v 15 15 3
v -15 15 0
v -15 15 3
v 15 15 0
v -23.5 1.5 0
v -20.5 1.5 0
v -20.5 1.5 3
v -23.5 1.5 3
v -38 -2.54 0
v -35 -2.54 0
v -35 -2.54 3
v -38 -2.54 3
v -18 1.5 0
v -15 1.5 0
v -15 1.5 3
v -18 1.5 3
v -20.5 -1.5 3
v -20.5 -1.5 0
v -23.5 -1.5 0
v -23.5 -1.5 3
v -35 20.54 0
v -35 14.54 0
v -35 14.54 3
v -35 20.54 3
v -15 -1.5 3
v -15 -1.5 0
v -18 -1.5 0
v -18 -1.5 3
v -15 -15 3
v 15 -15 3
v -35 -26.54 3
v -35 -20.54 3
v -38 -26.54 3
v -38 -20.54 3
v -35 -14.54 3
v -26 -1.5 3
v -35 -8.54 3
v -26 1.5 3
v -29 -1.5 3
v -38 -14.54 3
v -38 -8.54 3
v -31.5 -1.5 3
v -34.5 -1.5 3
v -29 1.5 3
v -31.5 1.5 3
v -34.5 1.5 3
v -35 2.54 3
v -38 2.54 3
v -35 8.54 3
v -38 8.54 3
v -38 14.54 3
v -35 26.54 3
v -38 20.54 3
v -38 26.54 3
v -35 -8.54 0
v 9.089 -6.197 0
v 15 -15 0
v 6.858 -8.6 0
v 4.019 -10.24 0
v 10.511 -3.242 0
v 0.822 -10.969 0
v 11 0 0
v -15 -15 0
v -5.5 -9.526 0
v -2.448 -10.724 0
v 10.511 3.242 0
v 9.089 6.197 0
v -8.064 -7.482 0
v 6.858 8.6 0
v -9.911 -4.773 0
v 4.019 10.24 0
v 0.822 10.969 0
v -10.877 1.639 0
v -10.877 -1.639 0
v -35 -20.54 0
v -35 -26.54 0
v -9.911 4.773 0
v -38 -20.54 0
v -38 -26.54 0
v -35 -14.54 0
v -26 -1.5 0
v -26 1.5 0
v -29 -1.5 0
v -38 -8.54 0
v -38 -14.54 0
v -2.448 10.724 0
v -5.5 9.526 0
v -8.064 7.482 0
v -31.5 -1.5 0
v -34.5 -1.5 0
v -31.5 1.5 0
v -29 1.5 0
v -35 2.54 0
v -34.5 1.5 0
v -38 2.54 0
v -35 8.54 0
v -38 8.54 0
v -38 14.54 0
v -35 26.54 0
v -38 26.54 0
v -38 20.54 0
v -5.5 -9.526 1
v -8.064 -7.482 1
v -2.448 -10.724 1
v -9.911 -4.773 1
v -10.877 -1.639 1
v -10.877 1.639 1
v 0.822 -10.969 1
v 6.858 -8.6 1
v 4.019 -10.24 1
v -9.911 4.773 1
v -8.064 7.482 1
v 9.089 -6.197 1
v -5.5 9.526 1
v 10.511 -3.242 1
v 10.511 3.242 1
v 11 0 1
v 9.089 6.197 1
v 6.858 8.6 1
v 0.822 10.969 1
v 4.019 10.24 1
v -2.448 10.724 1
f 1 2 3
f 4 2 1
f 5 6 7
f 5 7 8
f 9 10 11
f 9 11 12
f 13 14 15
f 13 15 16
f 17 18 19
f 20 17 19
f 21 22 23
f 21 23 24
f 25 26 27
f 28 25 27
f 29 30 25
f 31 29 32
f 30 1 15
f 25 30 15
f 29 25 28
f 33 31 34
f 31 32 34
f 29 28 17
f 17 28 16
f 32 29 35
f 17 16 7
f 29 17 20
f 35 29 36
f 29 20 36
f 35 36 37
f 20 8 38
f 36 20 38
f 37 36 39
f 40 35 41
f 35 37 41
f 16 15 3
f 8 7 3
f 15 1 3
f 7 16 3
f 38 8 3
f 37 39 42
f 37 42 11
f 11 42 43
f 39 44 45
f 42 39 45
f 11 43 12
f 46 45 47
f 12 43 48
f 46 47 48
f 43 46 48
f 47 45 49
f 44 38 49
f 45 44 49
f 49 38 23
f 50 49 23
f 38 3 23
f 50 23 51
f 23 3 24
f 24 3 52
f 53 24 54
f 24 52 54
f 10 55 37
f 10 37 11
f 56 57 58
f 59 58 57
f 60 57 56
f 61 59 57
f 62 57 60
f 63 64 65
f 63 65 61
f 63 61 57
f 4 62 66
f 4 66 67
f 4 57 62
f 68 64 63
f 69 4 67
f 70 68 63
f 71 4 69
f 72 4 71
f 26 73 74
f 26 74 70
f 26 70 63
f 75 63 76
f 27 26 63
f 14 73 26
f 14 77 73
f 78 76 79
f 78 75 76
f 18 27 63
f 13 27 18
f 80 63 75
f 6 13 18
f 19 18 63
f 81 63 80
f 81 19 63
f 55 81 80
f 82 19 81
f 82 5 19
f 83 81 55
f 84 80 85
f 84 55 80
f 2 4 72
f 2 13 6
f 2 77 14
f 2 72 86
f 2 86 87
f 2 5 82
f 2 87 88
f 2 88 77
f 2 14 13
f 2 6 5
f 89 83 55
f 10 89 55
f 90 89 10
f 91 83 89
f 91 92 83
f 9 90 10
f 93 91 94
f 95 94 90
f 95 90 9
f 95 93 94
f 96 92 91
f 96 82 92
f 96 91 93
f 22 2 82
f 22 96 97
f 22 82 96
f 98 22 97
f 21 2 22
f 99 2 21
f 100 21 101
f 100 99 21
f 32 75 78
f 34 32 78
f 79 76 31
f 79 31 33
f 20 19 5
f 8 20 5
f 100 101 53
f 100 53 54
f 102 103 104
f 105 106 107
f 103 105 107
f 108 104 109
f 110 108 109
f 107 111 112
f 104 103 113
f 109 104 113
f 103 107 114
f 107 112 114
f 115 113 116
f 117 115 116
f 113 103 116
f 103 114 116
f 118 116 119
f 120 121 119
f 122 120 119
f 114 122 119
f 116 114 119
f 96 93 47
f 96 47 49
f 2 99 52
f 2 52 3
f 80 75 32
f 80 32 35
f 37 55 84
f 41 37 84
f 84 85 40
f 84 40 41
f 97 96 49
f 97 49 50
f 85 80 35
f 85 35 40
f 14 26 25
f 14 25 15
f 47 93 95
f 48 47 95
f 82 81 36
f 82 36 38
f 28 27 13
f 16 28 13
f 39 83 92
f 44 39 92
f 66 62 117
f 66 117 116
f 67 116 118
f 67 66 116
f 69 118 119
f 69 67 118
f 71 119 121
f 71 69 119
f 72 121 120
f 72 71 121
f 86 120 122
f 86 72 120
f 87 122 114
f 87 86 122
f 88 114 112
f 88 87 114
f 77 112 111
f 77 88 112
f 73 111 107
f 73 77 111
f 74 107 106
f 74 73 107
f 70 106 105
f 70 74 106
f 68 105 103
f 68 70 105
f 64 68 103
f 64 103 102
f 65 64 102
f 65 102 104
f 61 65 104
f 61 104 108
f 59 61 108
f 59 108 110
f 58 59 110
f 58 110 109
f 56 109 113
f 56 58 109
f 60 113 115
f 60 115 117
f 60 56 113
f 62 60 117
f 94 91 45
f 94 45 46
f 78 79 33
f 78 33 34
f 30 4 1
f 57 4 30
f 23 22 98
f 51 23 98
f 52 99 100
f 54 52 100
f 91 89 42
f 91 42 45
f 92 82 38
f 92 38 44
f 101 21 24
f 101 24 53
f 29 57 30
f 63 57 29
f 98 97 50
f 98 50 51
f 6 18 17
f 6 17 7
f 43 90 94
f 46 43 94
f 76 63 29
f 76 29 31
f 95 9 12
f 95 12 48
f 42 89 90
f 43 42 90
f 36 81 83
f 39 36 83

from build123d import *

# Parameters (mm, degrees)
BOSS_EXTRUDE1_DEPTH   = 3
SKETCH1_3_R           = 11
CUT_EXTRUDE1_DEPTH    = 1
SKETCH2_W             = 3
SKETCH2_H             = 6
BOSS_EXTRUDE2_DEPTH   = 3
BOSS_EXTRUDE2_2_DEPTH = 3
SKETCH2_H_2           = 5.08
BOSS_EXTRUDE2_3_DEPTH = 3
BOSS_EXTRUDE2_4_DEPTH = 3
BOSS_EXTRUDE2_5_DEPTH = 3
SKETCH3_W             = 3
SKETCH3_H             = 3
CUT_EXTRUDE2_DEPTH    = 3


with BuildPart() as part:
    # Sketch1 → Boss-Extrude1 (new body)
    with BuildSketch(Plane.XY):
        Polygon((-15, 15), (-35, 26.54), (-35, -26.54), (-15, -15), (15, -15), (15, 15), align=None)
    extrude(amount=BOSS_EXTRUDE1_DEPTH)

    # Sketch1<3> → Cut-Extrude1 (cut)
    with BuildSketch(Plane.XY):
        Circle(SKETCH1_3_R)
    extrude(amount=CUT_EXTRUDE1_DEPTH, mode=Mode.SUBTRACT)

    # Sketch3 → Cut-Extrude2 (cut)
    with BuildSketch(Plane(origin=(0, 0, 0), x_dir=(-1, 0, 0), z_dir=(0, 0, -1))):
        with Locations((22, 0)):
            Rectangle(SKETCH3_W, SKETCH3_H)
        with Locations((16.5, 0)):
            Rectangle(SKETCH3_W, SKETCH3_H)
        with Locations((27.5, 0)):
            Rectangle(SKETCH3_W, SKETCH3_H)
        with Locations((33, 0)):
            Rectangle(SKETCH3_W, SKETCH3_H)
    extrude(amount=-CUT_EXTRUDE2_DEPTH, mode=Mode.SUBTRACT)


with BuildPart() as body_2:
    # Sketch2 → Boss-Extrude2 (new body)
    with BuildSketch(Plane(origin=(0, 0, 0), x_dir=(-1, 0, 0), z_dir=(0, 0, -1))):
        with Locations((36.5, -23.54)):
            Rectangle(SKETCH2_W, SKETCH2_H)
    extrude(amount=-BOSS_EXTRUDE2_DEPTH)


with BuildPart() as body_3:
    # Sketch2 → Boss-Extrude2 2 (new body)
    with BuildSketch(Plane(origin=(0, 0, 0), x_dir=(-1, 0, 0), z_dir=(0, 0, -1))):
        with Locations((36.5, -11.54)):
            Rectangle(SKETCH2_W, SKETCH2_H)
    extrude(amount=-BOSS_EXTRUDE2_2_DEPTH)


with BuildPart() as body_4:
    # Sketch2 → Boss-Extrude2 3 (new body)
    with BuildSketch(Plane(origin=(0, 0, 0), x_dir=(-1, 0, 0), z_dir=(0, 0, -1))):
        with Locations((36.5, 0)):
            Rectangle(SKETCH2_W, SKETCH2_H_2)
    extrude(amount=-BOSS_EXTRUDE2_3_DEPTH)


with BuildPart() as body_5:
    # Sketch2 → Boss-Extrude2 4 (new body)
    with BuildSketch(Plane(origin=(0, 0, 0), x_dir=(-1, 0, 0), z_dir=(0, 0, -1))):
        with Locations((36.5, 11.54)):
            Rectangle(SKETCH2_W, SKETCH2_H)
    extrude(amount=-BOSS_EXTRUDE2_4_DEPTH)


with BuildPart() as body_6:
    # Sketch2 → Boss-Extrude2 5 (new body)
    with BuildSketch(Plane(origin=(0, 0, 0), x_dir=(-1, 0, 0), z_dir=(0, 0, -1))):
        with Locations((36.5, 23.54)):
            Rectangle(SKETCH2_W, SKETCH2_H)
    extrude(amount=-BOSS_EXTRUDE2_5_DEPTH)


with BuildPart() as body_4_1:
    add(body_4.part)

    # Combine1: union body 2, body 5, part, body 6, body 3
    add(body_2.part)
    add(body_5.part)
    add(part.part)
    add(body_6.part)
    add(body_3.part)


solid = body_4_1.part
